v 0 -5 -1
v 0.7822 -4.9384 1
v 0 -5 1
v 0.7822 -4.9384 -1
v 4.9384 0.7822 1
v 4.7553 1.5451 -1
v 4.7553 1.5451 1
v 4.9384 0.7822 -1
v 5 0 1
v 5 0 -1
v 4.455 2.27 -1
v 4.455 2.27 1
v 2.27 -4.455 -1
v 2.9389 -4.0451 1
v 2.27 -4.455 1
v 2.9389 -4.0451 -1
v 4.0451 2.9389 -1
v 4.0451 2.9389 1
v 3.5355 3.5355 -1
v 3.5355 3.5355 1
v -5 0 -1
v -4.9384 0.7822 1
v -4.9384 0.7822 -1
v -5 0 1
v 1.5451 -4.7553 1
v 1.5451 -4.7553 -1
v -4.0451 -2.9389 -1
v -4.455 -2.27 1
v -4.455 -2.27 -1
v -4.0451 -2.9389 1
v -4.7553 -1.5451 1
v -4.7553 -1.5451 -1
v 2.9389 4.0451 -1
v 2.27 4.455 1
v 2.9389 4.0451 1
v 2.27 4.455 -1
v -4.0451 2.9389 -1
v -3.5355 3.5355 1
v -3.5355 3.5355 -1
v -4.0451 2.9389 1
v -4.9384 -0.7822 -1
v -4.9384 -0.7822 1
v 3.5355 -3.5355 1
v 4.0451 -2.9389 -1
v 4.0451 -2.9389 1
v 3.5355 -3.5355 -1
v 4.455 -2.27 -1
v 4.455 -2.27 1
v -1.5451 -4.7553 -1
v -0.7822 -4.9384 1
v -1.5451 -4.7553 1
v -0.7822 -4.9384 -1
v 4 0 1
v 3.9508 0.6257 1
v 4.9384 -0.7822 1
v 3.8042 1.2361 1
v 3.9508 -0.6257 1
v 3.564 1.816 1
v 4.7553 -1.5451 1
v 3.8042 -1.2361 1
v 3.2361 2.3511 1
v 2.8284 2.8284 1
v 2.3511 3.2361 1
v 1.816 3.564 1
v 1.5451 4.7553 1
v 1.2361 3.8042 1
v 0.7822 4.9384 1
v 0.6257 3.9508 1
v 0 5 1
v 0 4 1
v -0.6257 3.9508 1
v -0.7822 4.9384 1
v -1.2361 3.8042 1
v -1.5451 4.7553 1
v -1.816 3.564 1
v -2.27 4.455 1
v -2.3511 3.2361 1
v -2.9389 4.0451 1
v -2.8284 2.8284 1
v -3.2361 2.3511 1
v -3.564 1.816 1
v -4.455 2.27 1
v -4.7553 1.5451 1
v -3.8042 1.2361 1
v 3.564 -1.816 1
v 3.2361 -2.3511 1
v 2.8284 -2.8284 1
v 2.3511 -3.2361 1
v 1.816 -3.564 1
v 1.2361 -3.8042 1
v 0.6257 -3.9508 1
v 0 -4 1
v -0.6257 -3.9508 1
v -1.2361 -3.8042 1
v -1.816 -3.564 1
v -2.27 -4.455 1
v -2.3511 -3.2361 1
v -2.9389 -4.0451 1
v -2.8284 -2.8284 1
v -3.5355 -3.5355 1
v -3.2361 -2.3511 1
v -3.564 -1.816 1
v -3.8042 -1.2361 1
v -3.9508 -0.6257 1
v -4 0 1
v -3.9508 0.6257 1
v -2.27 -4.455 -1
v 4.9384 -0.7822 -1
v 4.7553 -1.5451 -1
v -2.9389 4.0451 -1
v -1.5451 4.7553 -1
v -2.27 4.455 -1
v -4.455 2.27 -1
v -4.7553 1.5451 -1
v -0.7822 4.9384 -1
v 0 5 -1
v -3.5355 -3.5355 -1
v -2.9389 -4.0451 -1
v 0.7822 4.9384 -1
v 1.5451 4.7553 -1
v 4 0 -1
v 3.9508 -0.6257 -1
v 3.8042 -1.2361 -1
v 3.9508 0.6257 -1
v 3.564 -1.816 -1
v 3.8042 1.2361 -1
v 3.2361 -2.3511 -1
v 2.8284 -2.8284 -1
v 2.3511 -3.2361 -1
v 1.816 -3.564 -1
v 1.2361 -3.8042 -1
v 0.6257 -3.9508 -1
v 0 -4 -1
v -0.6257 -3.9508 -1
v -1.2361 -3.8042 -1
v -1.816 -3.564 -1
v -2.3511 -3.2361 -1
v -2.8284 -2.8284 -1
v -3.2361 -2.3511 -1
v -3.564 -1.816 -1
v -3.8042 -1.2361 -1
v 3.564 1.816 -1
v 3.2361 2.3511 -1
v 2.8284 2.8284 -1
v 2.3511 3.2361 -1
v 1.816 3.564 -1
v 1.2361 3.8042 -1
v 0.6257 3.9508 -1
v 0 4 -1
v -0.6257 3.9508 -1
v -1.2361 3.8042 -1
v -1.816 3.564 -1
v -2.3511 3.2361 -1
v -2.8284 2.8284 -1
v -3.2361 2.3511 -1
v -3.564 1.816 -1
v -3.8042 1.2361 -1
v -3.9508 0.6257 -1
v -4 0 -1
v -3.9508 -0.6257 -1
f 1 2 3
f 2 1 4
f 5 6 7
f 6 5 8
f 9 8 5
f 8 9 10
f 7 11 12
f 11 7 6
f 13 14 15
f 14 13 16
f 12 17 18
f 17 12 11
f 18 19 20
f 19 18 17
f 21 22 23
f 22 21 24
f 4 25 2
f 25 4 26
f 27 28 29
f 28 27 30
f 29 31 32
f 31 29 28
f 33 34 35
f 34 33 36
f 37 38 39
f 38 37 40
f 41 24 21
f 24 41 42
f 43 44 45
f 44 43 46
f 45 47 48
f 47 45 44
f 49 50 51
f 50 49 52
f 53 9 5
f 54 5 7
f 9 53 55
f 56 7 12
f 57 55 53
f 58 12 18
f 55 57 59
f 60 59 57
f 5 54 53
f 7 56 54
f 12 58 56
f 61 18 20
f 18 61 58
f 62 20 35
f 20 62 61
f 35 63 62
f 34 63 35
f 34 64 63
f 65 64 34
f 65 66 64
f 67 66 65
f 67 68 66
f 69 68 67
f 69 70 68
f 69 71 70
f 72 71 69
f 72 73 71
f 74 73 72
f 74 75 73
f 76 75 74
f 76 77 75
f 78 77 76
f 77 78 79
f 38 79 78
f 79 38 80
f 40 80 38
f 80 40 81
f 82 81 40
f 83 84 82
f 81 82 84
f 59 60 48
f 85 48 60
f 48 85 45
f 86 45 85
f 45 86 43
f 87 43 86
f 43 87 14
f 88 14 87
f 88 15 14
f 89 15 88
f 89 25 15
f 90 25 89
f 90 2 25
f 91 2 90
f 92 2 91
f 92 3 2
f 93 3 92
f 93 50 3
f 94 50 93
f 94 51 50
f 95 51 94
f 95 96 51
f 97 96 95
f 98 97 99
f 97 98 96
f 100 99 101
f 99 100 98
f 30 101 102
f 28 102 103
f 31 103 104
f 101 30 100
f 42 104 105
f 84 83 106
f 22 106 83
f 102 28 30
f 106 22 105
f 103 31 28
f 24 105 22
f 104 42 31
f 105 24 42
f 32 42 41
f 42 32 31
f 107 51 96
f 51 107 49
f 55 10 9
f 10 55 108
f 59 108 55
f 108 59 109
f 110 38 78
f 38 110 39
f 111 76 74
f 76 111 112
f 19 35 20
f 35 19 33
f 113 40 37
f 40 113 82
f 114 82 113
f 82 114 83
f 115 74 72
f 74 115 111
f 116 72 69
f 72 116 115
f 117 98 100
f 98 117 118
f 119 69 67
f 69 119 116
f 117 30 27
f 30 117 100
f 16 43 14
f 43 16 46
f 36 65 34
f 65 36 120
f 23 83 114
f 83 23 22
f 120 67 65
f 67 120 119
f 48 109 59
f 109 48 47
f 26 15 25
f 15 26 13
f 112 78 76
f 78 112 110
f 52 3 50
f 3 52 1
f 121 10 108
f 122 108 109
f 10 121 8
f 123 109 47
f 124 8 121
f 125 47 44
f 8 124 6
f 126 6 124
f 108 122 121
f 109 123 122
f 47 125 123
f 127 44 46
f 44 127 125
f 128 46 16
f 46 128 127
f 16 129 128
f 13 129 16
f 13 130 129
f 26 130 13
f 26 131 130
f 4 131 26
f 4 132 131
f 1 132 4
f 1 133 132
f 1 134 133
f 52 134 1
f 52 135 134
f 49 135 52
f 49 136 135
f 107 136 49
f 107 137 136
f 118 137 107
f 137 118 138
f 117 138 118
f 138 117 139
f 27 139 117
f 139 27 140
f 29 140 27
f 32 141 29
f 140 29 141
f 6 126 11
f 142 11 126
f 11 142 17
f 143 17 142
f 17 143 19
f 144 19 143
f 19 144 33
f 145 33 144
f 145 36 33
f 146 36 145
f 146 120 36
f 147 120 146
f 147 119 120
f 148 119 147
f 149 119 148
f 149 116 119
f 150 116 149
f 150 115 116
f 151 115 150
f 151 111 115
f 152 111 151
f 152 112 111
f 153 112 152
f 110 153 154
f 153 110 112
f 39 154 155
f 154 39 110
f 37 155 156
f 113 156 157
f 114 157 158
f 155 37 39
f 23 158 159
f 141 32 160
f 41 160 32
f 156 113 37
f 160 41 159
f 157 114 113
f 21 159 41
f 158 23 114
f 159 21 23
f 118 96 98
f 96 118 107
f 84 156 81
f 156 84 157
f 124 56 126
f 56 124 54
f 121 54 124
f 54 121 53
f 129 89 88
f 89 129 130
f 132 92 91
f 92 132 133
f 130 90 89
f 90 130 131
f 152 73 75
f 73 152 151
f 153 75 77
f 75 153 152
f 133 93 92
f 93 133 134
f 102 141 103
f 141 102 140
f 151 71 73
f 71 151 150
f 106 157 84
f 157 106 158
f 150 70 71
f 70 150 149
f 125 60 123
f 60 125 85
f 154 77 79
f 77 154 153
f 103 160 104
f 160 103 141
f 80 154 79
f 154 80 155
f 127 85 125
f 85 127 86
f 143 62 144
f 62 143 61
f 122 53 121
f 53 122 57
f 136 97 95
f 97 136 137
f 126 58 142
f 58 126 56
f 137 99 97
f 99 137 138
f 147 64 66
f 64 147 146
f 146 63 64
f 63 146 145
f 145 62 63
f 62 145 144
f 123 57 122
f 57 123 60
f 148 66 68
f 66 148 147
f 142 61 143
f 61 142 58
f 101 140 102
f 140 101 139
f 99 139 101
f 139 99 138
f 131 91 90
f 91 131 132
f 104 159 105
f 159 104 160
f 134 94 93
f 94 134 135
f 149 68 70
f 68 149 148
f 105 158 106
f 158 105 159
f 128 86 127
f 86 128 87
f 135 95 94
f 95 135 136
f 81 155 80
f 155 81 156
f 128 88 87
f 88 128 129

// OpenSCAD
bolt_hole=4; //[1:10]

washer_outer_diameter=5; //[1:20]

washer_thickness=2;


difference(){
	cylinder(r= washer_outer_diameter ,h= washer_thickness ,center=true,$fn=40);

	cylinder(r= bolt_hole ,h= washer_thickness + 2 ,center=true,$fn=40);
}
